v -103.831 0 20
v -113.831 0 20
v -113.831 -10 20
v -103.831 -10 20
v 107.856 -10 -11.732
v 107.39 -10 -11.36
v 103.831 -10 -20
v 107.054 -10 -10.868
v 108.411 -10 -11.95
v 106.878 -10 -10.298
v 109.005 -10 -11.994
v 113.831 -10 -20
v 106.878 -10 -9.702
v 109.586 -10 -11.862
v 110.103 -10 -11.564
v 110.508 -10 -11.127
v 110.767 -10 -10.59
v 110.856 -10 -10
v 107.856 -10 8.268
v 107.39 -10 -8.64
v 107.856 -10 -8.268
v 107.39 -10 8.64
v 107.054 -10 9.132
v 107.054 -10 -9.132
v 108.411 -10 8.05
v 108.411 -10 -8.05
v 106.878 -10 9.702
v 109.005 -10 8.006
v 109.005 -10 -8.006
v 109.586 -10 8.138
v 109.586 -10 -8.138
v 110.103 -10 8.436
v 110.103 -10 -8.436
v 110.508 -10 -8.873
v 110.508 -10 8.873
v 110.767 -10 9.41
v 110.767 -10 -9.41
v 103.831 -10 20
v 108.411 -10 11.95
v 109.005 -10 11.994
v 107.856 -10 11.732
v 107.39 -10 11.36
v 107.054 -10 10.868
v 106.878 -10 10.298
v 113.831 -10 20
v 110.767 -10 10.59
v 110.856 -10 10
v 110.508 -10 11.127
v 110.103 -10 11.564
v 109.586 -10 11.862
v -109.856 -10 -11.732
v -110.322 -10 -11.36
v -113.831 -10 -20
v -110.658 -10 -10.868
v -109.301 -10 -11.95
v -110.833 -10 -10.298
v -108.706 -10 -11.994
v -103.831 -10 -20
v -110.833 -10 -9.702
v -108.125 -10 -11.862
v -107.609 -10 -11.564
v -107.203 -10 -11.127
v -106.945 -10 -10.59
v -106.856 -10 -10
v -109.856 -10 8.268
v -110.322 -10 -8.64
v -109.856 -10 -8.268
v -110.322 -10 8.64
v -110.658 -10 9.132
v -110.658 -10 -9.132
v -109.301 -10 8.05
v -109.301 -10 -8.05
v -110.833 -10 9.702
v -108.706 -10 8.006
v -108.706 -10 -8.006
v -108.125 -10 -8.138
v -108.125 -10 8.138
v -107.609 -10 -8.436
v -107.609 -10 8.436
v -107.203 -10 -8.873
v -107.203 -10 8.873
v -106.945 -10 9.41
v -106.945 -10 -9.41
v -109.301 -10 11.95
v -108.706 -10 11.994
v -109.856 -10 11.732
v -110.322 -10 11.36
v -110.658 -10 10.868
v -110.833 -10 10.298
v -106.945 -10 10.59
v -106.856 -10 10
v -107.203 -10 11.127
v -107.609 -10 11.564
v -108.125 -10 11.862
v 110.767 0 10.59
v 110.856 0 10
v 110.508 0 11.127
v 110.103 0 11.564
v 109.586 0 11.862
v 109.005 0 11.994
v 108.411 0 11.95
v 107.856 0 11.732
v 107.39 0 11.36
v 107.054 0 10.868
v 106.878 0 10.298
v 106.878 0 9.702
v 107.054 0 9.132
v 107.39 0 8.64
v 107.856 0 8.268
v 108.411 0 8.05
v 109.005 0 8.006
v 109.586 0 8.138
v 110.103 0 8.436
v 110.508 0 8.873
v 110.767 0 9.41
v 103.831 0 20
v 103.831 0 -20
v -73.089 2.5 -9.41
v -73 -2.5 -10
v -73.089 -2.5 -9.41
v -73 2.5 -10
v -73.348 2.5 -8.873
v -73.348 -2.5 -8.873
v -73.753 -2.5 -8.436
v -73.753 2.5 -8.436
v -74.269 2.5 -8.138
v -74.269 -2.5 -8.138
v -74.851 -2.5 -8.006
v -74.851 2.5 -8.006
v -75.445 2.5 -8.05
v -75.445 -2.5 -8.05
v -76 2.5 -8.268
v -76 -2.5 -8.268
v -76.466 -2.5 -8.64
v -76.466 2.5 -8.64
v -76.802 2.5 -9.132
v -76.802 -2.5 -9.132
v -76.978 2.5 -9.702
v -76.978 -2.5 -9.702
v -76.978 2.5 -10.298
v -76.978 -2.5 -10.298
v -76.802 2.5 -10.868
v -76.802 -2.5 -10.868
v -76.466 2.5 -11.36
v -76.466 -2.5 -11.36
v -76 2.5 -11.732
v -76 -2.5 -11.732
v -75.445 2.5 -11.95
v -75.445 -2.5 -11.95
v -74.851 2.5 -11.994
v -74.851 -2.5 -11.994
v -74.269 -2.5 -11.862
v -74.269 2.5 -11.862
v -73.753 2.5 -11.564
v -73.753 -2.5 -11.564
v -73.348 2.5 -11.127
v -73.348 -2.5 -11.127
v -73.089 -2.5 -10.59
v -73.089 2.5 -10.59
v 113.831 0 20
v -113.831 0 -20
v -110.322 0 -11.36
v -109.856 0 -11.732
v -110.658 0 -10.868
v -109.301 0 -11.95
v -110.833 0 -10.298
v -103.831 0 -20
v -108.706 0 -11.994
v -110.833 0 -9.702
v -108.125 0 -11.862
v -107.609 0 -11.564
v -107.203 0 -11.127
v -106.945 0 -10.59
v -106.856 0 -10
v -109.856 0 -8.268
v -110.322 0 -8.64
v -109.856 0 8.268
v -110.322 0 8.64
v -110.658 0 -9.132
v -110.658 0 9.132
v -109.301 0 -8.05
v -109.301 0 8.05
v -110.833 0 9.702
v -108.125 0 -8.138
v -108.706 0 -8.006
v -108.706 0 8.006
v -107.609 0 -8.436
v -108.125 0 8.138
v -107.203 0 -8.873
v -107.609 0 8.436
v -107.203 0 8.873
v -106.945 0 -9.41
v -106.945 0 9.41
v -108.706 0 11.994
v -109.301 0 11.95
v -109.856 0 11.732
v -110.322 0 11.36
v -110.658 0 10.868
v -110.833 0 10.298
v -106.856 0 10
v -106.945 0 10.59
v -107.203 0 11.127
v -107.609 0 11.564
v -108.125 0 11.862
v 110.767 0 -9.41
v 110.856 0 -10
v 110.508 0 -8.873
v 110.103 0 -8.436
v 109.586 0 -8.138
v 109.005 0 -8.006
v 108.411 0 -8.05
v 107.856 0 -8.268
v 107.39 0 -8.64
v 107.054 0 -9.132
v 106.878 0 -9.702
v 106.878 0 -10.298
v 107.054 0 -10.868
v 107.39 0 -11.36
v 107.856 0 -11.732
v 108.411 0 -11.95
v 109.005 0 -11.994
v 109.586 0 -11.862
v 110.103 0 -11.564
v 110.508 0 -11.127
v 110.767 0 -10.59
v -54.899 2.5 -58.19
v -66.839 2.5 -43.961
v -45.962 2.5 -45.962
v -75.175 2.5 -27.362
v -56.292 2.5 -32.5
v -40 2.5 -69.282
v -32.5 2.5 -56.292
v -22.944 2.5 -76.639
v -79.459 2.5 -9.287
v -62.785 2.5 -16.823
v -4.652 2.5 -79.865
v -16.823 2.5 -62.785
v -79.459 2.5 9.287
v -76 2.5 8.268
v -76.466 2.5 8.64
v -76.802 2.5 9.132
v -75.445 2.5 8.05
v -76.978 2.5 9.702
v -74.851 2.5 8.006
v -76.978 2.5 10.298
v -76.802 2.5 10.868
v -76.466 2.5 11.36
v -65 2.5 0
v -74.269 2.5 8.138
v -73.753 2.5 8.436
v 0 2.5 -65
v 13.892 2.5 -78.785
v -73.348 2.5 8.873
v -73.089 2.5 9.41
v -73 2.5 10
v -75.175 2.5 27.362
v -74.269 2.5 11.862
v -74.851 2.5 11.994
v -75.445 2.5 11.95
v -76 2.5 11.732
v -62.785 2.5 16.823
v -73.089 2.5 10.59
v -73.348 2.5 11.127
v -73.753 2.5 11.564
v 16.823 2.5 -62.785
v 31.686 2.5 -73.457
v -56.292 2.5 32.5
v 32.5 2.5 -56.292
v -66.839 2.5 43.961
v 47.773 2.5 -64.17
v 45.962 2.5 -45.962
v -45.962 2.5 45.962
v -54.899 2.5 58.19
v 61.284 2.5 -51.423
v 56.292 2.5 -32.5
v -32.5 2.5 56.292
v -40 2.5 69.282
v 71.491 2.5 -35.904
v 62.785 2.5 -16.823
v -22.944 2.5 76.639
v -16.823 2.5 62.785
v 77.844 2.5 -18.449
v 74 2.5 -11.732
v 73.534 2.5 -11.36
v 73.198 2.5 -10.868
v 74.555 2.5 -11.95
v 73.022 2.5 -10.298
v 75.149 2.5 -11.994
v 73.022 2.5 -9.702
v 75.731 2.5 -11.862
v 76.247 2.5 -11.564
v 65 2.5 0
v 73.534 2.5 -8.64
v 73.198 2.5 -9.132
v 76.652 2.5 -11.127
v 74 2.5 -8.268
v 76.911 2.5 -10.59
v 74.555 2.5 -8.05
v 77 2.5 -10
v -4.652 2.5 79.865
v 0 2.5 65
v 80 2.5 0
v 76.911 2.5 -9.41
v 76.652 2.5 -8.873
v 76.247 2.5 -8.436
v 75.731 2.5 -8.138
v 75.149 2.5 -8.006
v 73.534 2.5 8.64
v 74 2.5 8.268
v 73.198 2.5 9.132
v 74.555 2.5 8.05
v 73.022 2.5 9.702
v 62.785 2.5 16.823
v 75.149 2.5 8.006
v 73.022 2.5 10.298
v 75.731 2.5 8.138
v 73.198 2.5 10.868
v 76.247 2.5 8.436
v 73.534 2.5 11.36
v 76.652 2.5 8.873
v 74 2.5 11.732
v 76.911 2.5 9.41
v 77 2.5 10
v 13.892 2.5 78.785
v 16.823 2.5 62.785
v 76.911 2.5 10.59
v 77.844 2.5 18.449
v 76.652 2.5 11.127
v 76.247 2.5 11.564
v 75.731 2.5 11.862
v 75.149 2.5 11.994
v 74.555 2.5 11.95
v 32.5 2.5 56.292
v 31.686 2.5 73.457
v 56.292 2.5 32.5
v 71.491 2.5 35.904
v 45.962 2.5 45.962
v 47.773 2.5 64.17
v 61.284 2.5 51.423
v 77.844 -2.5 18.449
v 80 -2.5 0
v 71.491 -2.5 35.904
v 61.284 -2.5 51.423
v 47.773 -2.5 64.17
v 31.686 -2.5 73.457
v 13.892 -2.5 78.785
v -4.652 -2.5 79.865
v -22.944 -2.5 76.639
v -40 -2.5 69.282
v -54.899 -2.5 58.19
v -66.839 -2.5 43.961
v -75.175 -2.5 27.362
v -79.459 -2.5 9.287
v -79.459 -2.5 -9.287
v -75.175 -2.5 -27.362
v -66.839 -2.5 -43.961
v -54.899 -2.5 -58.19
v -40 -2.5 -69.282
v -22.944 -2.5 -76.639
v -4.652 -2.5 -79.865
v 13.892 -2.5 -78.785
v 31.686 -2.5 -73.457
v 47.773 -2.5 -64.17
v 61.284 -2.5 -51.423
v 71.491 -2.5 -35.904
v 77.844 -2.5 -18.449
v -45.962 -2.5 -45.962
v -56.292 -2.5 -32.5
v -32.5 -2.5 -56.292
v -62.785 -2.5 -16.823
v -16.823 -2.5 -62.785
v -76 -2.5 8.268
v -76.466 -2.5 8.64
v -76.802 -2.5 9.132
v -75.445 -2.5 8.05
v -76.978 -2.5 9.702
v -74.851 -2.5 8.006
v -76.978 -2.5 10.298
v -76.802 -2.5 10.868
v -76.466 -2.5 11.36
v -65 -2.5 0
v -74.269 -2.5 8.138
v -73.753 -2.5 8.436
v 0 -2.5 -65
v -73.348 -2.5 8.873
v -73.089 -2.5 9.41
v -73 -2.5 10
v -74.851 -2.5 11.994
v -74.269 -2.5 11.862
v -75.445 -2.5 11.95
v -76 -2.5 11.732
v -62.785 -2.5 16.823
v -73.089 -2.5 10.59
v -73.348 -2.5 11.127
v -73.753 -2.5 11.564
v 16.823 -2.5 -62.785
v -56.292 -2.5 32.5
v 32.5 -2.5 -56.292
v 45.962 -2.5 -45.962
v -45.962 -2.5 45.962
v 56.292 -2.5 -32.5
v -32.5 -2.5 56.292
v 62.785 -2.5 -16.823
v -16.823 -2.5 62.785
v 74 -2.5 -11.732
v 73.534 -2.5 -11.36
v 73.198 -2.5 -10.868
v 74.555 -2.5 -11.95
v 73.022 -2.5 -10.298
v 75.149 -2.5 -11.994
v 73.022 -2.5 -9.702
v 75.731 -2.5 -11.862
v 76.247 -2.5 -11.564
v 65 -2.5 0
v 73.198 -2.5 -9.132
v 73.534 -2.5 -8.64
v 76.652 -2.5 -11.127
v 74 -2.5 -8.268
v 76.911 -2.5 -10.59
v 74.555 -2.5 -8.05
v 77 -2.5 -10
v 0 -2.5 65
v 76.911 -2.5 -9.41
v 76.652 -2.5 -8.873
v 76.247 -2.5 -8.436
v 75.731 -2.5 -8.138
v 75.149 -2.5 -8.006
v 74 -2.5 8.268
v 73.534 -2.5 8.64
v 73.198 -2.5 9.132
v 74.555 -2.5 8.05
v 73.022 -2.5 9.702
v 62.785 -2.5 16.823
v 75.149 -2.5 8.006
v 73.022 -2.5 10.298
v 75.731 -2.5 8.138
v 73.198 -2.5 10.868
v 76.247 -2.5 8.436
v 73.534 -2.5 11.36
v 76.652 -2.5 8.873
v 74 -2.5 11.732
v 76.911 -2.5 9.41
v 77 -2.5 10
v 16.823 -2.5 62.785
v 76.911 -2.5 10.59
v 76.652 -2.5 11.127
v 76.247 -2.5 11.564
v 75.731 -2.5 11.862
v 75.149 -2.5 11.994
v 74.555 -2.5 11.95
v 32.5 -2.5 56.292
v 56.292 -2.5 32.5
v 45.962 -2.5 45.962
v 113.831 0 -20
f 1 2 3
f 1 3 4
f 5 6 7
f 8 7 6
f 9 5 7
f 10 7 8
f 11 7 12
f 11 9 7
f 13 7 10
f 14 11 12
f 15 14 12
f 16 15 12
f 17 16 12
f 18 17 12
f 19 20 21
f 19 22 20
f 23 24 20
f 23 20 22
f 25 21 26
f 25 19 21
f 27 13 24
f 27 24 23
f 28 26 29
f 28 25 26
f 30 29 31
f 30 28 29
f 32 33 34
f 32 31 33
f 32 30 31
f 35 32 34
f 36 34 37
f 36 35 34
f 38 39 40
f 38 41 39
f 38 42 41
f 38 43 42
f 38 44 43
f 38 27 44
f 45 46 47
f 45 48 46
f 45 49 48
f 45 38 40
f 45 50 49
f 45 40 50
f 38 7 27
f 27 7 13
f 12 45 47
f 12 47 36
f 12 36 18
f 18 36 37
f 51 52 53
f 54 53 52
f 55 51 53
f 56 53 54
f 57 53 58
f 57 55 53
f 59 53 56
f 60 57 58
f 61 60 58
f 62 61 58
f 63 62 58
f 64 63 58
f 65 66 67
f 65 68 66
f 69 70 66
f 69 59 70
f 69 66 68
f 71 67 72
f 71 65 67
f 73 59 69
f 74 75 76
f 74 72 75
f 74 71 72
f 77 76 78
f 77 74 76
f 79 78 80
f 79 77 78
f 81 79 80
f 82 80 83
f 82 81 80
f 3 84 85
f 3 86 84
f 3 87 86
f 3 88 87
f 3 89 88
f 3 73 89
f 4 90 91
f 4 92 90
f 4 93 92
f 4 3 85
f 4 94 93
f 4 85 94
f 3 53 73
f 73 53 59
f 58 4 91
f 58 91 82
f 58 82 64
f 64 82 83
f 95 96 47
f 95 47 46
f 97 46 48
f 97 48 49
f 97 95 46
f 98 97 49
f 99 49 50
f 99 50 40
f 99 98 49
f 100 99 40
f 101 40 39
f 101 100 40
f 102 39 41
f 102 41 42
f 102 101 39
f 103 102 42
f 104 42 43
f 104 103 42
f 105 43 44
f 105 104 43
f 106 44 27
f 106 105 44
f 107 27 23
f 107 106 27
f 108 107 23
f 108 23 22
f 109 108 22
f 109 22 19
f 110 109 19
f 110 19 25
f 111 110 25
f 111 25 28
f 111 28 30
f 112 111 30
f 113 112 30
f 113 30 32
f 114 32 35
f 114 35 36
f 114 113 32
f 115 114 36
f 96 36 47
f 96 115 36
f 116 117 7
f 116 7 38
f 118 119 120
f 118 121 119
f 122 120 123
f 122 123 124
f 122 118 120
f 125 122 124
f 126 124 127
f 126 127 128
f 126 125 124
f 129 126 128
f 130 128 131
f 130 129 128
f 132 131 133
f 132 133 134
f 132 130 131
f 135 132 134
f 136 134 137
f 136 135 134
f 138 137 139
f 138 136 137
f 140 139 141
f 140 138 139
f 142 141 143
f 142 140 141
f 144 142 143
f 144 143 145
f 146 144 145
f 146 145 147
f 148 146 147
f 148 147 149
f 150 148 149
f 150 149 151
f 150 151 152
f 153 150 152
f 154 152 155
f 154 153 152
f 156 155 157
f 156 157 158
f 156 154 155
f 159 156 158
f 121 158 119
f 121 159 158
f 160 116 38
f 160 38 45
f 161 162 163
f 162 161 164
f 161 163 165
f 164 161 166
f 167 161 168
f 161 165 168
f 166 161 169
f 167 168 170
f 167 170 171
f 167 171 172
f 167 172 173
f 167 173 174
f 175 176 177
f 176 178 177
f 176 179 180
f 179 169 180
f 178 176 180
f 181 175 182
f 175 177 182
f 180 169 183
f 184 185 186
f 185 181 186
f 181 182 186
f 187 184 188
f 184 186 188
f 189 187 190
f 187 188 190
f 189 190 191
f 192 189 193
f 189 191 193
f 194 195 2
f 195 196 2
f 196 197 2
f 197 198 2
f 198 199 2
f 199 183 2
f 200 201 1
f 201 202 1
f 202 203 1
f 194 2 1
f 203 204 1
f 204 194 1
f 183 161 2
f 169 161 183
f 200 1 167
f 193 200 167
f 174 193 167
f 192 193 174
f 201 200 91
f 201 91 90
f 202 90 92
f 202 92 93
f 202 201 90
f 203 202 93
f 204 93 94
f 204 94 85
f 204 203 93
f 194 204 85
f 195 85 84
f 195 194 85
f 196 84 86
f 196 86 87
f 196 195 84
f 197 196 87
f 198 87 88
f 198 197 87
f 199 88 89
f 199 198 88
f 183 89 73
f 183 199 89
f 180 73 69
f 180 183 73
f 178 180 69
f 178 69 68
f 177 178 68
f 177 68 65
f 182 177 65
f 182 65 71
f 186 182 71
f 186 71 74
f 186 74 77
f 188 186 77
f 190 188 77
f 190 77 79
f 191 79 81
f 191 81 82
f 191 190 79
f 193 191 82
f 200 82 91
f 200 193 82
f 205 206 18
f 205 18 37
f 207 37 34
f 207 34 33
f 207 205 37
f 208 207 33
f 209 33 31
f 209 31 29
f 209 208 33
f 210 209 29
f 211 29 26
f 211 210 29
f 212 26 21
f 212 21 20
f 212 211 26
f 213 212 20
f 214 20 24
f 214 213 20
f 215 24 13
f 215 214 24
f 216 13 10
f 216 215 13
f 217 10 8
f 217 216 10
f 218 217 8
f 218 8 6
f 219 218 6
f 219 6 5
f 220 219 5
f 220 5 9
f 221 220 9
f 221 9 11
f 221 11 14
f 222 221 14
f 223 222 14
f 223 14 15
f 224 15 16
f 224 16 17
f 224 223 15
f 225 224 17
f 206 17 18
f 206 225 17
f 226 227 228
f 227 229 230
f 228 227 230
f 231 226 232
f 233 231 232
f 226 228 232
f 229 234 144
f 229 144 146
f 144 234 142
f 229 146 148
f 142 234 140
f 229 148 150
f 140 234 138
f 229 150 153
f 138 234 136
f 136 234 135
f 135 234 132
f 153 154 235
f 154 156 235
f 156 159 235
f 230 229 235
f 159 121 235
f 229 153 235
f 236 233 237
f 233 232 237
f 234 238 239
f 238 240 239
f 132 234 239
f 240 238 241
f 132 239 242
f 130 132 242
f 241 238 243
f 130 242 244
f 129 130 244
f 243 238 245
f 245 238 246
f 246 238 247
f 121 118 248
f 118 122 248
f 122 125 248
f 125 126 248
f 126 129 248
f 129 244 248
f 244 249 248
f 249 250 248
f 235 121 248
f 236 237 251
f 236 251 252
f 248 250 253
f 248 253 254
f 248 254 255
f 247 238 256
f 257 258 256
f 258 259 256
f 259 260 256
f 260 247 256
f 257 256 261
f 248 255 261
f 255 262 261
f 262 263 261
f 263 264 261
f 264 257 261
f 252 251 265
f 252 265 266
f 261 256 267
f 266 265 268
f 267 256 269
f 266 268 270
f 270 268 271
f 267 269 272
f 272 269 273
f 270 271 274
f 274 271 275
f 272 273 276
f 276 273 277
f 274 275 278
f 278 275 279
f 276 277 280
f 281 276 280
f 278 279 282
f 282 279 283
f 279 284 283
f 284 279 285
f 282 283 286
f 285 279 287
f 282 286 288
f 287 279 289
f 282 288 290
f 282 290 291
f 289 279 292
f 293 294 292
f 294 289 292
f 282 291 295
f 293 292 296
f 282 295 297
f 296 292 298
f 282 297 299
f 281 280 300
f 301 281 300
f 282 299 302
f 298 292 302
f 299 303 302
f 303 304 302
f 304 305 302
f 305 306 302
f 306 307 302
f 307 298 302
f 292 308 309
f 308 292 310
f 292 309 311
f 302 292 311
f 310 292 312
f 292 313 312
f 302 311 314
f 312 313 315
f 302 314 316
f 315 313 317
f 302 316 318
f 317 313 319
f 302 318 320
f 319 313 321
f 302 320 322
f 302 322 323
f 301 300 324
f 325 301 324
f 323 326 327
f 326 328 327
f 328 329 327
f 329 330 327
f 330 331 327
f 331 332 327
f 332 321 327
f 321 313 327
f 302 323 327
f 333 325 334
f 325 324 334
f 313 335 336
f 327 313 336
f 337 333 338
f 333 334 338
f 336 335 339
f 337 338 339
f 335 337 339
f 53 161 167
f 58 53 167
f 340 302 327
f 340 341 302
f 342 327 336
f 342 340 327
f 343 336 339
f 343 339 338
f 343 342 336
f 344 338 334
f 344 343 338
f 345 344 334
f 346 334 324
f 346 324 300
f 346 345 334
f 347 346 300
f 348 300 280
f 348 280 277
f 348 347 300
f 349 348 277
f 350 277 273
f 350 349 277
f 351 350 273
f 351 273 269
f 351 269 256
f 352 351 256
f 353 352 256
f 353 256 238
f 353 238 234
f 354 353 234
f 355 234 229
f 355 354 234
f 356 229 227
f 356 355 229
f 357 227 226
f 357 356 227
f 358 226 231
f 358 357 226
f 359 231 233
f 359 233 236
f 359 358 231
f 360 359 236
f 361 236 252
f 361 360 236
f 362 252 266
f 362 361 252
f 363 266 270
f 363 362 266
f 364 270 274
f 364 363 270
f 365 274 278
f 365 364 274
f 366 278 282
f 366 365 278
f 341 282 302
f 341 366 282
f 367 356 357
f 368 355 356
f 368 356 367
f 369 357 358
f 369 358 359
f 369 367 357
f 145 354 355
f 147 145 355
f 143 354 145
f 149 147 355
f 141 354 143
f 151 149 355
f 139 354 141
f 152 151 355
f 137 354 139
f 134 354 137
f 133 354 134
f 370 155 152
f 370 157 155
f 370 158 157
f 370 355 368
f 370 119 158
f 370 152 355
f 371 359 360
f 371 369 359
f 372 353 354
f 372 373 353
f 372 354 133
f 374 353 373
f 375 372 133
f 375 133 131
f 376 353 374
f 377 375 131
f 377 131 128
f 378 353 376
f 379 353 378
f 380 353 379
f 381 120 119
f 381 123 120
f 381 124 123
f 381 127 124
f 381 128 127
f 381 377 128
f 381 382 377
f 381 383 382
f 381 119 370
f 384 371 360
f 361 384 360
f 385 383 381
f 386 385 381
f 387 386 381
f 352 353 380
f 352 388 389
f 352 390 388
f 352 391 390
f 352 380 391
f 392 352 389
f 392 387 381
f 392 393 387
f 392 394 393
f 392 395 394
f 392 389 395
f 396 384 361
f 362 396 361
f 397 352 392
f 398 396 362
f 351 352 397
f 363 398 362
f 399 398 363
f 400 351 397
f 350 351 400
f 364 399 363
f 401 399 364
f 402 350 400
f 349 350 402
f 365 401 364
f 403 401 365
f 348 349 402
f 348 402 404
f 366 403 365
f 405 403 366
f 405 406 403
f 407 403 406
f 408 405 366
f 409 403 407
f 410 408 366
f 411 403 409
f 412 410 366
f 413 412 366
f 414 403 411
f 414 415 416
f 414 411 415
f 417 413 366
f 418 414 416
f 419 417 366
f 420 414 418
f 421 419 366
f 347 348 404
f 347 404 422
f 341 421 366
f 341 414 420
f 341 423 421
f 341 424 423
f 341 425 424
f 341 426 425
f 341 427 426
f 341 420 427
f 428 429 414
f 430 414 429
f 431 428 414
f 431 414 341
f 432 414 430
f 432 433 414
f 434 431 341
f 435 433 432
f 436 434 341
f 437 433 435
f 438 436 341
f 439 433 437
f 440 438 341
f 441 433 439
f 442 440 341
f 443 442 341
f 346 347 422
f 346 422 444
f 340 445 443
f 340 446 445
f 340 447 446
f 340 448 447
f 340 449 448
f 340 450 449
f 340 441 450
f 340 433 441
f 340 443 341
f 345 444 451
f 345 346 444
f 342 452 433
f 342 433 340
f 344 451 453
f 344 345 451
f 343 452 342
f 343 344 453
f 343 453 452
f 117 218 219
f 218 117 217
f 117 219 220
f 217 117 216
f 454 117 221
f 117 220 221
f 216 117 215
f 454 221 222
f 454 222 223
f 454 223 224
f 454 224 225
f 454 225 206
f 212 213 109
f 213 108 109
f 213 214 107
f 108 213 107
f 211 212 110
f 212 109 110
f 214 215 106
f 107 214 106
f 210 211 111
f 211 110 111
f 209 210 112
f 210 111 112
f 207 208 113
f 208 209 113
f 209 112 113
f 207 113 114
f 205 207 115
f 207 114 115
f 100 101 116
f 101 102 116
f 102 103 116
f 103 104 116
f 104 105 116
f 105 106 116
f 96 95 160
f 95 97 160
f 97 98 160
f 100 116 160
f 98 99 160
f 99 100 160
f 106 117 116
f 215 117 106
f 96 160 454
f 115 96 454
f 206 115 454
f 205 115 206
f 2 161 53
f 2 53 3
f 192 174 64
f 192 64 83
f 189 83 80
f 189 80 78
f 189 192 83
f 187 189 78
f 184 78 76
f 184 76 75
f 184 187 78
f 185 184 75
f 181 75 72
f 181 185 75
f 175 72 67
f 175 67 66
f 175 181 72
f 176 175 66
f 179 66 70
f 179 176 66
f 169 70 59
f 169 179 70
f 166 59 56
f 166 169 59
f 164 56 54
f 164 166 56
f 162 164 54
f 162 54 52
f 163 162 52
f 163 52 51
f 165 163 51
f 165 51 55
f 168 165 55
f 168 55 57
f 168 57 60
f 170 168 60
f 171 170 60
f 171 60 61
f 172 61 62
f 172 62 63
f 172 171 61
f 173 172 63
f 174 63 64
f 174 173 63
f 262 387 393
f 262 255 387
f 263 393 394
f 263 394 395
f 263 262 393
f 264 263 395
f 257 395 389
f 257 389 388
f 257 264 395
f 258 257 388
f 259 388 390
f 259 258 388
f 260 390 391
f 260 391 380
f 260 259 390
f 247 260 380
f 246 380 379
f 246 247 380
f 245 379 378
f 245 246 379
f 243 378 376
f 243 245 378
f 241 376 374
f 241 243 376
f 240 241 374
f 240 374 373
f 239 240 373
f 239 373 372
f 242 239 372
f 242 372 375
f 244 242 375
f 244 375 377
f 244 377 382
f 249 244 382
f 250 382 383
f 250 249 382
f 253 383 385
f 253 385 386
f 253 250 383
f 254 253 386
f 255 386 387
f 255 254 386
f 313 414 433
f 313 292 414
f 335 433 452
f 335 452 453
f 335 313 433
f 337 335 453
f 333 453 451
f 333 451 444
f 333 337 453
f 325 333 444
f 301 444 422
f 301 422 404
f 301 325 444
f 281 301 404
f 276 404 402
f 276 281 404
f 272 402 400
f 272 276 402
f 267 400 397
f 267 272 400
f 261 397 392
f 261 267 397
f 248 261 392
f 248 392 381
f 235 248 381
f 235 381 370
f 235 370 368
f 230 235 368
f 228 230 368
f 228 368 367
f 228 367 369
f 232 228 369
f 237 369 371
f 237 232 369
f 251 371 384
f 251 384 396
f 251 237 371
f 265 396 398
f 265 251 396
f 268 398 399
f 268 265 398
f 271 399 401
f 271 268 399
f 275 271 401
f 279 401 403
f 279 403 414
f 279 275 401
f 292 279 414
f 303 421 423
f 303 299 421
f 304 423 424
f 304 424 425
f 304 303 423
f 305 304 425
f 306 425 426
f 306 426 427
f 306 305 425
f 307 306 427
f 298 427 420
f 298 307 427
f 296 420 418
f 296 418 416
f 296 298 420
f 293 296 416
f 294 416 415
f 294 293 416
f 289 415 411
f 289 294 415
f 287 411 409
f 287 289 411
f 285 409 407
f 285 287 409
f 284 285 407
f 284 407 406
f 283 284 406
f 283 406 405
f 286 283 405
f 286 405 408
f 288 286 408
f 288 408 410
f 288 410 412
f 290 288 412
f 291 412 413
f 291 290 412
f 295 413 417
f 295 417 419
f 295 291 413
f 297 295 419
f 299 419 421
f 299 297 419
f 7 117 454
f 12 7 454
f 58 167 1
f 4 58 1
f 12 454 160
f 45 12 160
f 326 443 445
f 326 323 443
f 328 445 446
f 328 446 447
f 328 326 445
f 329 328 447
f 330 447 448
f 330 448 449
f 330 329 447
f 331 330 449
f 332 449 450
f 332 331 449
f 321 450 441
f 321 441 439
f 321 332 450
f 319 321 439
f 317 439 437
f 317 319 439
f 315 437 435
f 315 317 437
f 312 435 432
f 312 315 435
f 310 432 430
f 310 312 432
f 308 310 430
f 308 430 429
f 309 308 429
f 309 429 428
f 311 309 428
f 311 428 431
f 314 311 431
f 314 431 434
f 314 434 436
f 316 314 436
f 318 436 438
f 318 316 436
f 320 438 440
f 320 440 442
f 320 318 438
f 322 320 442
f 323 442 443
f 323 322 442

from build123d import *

# Parameters (mm, degrees)
F0_R     = 80
F0_R_2   = 2
F0_R_3   = 65
F1_DEPTH = 2.5
F2_W     = 10
F2_H     = 40
F2_R     = 2
F3_DEPTH = 10


with BuildPart() as f1:
    # F0 (on Front) → F1 (new body, symmetric)
    with BuildSketch(Plane.XZ):
        Circle(F0_R)
        with Locations((-75, -10)):
            Circle(F0_R_2, mode=Mode.SUBTRACT)
        with Locations((75, -10)):
            Circle(F0_R_2, mode=Mode.SUBTRACT)
        with Locations((-75, 10)):
            Circle(F0_R_2, mode=Mode.SUBTRACT)
        Circle(F0_R_3, mode=Mode.SUBTRACT)
        with Locations((75, 10)):
            Circle(F0_R_2, mode=Mode.SUBTRACT)
    extrude(amount=F1_DEPTH, both=True)


with BuildPart() as f3:
    # F2 (on Front) → F3 (new body)
    with BuildSketch(Plane.XZ):
        with Locations((-108.8307350874, 0)):
            Rectangle(F2_W, F2_H)
        with Locations((-108.8558137417, -10)):
            Circle(F2_R, mode=Mode.SUBTRACT)
        with Locations((-108.8558137417, 10)):
            Circle(F2_R, mode=Mode.SUBTRACT)
    extrude(amount=F3_DEPTH)


with BuildPart() as f3b:
    # F2 (on Front) → F3, piece 2 (new body)
    with BuildSketch(Plane.XZ):
        with Locations((108.8307350874, 0)):
            Rectangle(F2_W, F2_H)
        with Locations((108.8558137417, -10)):
            Circle(F2_R, mode=Mode.SUBTRACT)
        with Locations((108.8558137417, 10)):
            Circle(F2_R, mode=Mode.SUBTRACT)
    extrude(amount=F3_DEPTH)


solid = Compound([f1.part, f3.part, f3b.part])
